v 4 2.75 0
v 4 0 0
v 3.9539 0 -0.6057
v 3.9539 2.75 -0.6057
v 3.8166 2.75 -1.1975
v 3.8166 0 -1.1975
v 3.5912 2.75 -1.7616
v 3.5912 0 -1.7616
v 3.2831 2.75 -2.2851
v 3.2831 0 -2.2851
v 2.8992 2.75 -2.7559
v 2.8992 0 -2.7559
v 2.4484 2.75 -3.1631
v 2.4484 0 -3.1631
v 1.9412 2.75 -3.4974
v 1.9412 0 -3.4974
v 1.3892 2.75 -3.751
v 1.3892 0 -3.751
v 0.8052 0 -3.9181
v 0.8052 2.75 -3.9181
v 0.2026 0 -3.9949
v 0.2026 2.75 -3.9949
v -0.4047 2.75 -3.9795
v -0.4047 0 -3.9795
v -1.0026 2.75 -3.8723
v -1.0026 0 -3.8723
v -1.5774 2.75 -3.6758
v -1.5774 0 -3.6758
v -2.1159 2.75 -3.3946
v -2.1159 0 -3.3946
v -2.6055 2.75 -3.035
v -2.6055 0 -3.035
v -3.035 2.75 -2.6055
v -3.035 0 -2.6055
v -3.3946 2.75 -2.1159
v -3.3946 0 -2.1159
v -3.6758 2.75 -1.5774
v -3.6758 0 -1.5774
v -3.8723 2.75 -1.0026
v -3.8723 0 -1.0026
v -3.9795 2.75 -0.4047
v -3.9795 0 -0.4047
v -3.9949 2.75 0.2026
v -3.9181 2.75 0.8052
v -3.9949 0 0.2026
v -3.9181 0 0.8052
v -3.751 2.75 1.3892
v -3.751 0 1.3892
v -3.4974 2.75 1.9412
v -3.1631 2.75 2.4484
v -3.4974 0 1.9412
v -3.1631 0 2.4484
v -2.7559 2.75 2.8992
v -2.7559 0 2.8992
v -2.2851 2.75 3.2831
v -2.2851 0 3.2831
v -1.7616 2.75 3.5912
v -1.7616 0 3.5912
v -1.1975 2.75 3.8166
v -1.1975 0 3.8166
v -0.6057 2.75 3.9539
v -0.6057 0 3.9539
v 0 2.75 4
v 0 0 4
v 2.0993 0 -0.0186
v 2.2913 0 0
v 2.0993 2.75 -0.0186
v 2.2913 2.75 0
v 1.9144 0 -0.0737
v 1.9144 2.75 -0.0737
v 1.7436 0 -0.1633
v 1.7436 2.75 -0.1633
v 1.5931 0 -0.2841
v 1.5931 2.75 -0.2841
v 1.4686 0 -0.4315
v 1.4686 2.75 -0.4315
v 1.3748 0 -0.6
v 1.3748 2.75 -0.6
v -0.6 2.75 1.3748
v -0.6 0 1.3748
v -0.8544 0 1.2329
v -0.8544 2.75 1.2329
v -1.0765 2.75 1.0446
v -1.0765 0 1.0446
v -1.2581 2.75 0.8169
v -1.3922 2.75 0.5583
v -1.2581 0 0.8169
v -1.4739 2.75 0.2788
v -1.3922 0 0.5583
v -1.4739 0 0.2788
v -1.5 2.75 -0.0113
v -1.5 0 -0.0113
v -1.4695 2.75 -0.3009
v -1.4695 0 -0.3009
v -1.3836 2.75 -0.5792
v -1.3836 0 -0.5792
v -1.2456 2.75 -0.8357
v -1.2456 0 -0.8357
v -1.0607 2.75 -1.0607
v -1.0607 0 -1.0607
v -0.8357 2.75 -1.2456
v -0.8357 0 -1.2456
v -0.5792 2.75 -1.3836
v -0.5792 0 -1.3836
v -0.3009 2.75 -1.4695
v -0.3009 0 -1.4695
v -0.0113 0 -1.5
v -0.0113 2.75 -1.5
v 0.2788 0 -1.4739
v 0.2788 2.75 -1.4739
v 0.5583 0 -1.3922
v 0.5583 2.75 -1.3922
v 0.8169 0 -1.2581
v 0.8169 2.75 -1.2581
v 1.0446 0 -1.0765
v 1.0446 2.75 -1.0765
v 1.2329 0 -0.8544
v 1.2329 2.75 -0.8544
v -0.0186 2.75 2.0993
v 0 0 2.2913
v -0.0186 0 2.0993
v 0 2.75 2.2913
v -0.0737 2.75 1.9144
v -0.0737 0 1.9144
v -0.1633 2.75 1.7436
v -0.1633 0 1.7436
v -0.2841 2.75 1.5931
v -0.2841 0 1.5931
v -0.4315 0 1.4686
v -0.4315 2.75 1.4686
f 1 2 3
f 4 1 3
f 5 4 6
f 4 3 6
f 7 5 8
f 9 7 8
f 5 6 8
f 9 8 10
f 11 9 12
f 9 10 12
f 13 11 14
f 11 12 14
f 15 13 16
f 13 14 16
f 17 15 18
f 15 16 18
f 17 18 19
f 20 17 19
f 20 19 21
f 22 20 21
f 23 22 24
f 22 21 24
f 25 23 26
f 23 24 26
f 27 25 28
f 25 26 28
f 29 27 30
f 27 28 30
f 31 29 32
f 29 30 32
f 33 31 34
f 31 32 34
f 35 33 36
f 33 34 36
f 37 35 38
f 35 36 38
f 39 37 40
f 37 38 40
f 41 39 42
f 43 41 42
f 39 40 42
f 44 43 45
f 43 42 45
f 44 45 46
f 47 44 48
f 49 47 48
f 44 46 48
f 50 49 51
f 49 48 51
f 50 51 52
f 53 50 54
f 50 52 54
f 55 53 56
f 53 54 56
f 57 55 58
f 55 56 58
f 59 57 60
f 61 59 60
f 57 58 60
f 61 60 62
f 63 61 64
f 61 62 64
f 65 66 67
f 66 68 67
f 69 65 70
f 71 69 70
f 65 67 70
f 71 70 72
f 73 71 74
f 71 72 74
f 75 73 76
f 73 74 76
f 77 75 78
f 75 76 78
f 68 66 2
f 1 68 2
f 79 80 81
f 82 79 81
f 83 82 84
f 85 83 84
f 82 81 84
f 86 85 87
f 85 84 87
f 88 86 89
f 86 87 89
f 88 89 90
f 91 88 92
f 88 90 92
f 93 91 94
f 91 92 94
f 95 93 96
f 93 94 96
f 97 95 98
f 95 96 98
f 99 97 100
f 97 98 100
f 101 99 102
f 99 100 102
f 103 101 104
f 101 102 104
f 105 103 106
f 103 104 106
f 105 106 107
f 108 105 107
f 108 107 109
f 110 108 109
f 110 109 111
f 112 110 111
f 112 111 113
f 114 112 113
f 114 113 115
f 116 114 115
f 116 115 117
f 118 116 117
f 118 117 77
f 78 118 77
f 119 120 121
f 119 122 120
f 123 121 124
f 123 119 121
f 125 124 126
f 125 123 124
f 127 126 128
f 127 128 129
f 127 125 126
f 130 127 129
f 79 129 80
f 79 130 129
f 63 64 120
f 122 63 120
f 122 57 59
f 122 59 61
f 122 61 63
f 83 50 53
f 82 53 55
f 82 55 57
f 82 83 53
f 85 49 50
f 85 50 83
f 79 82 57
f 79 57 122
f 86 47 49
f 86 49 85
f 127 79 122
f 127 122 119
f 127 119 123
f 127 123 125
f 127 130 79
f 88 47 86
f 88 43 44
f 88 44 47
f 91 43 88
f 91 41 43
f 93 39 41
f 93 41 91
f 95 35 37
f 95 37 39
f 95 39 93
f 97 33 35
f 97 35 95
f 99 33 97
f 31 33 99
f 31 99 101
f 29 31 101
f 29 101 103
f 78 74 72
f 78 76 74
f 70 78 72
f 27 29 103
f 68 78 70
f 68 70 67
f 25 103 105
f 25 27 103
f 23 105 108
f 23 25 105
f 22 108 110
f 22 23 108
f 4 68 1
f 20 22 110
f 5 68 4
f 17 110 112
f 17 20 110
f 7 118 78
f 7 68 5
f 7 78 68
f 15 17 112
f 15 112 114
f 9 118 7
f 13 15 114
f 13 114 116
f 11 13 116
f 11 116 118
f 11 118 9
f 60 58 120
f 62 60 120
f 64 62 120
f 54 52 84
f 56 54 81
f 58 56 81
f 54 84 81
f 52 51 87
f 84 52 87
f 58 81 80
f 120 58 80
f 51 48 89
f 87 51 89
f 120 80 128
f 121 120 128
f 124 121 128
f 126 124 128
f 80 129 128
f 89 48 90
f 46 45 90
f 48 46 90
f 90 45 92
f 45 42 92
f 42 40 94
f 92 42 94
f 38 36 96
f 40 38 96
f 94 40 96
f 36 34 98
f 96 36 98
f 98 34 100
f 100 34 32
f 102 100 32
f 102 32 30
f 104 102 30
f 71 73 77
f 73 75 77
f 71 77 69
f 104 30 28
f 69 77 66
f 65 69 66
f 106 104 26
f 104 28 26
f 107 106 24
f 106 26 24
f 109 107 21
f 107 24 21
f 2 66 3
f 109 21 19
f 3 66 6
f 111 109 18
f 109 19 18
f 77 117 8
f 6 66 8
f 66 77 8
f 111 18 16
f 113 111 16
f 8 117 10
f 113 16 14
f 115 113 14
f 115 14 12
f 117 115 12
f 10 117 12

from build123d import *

# Parameters (mm, degrees)
SALIENTE_EXTRUIR1_DEPTH = 2.75
REDONDEO1_R             = 1


with BuildPart() as part:
    # Croquis1 → Saliente-Extruir1 (new body)
    with BuildSketch(Plane(origin=(0, 0, 0), x_dir=(1, 0, 0), z_dir=(0, 1, 0))):
        with BuildLine():
            Line((1.5, 0), (4, 0))
            ThreePointArc((4, 0), (-2.828427125, 2.828427125), (0, -4))
            Line((0, -4), (0, -1.5))
            ThreePointArc((0, -1.5), (-1.060660172, 1.060660172), (1.5, 0))
        make_face()
    extrude(amount=SALIENTE_EXTRUIR1_DEPTH)

    # Redondeo1
    redondeo1_edges = [part.edges().sort_by_distance(p)[0] for p in [
        (0, 1.375, 1.5),
        (1.5, 1.375, 0),
    ]]
    fillet(redondeo1_edges, radius=REDONDEO1_R)


solid = part.part
